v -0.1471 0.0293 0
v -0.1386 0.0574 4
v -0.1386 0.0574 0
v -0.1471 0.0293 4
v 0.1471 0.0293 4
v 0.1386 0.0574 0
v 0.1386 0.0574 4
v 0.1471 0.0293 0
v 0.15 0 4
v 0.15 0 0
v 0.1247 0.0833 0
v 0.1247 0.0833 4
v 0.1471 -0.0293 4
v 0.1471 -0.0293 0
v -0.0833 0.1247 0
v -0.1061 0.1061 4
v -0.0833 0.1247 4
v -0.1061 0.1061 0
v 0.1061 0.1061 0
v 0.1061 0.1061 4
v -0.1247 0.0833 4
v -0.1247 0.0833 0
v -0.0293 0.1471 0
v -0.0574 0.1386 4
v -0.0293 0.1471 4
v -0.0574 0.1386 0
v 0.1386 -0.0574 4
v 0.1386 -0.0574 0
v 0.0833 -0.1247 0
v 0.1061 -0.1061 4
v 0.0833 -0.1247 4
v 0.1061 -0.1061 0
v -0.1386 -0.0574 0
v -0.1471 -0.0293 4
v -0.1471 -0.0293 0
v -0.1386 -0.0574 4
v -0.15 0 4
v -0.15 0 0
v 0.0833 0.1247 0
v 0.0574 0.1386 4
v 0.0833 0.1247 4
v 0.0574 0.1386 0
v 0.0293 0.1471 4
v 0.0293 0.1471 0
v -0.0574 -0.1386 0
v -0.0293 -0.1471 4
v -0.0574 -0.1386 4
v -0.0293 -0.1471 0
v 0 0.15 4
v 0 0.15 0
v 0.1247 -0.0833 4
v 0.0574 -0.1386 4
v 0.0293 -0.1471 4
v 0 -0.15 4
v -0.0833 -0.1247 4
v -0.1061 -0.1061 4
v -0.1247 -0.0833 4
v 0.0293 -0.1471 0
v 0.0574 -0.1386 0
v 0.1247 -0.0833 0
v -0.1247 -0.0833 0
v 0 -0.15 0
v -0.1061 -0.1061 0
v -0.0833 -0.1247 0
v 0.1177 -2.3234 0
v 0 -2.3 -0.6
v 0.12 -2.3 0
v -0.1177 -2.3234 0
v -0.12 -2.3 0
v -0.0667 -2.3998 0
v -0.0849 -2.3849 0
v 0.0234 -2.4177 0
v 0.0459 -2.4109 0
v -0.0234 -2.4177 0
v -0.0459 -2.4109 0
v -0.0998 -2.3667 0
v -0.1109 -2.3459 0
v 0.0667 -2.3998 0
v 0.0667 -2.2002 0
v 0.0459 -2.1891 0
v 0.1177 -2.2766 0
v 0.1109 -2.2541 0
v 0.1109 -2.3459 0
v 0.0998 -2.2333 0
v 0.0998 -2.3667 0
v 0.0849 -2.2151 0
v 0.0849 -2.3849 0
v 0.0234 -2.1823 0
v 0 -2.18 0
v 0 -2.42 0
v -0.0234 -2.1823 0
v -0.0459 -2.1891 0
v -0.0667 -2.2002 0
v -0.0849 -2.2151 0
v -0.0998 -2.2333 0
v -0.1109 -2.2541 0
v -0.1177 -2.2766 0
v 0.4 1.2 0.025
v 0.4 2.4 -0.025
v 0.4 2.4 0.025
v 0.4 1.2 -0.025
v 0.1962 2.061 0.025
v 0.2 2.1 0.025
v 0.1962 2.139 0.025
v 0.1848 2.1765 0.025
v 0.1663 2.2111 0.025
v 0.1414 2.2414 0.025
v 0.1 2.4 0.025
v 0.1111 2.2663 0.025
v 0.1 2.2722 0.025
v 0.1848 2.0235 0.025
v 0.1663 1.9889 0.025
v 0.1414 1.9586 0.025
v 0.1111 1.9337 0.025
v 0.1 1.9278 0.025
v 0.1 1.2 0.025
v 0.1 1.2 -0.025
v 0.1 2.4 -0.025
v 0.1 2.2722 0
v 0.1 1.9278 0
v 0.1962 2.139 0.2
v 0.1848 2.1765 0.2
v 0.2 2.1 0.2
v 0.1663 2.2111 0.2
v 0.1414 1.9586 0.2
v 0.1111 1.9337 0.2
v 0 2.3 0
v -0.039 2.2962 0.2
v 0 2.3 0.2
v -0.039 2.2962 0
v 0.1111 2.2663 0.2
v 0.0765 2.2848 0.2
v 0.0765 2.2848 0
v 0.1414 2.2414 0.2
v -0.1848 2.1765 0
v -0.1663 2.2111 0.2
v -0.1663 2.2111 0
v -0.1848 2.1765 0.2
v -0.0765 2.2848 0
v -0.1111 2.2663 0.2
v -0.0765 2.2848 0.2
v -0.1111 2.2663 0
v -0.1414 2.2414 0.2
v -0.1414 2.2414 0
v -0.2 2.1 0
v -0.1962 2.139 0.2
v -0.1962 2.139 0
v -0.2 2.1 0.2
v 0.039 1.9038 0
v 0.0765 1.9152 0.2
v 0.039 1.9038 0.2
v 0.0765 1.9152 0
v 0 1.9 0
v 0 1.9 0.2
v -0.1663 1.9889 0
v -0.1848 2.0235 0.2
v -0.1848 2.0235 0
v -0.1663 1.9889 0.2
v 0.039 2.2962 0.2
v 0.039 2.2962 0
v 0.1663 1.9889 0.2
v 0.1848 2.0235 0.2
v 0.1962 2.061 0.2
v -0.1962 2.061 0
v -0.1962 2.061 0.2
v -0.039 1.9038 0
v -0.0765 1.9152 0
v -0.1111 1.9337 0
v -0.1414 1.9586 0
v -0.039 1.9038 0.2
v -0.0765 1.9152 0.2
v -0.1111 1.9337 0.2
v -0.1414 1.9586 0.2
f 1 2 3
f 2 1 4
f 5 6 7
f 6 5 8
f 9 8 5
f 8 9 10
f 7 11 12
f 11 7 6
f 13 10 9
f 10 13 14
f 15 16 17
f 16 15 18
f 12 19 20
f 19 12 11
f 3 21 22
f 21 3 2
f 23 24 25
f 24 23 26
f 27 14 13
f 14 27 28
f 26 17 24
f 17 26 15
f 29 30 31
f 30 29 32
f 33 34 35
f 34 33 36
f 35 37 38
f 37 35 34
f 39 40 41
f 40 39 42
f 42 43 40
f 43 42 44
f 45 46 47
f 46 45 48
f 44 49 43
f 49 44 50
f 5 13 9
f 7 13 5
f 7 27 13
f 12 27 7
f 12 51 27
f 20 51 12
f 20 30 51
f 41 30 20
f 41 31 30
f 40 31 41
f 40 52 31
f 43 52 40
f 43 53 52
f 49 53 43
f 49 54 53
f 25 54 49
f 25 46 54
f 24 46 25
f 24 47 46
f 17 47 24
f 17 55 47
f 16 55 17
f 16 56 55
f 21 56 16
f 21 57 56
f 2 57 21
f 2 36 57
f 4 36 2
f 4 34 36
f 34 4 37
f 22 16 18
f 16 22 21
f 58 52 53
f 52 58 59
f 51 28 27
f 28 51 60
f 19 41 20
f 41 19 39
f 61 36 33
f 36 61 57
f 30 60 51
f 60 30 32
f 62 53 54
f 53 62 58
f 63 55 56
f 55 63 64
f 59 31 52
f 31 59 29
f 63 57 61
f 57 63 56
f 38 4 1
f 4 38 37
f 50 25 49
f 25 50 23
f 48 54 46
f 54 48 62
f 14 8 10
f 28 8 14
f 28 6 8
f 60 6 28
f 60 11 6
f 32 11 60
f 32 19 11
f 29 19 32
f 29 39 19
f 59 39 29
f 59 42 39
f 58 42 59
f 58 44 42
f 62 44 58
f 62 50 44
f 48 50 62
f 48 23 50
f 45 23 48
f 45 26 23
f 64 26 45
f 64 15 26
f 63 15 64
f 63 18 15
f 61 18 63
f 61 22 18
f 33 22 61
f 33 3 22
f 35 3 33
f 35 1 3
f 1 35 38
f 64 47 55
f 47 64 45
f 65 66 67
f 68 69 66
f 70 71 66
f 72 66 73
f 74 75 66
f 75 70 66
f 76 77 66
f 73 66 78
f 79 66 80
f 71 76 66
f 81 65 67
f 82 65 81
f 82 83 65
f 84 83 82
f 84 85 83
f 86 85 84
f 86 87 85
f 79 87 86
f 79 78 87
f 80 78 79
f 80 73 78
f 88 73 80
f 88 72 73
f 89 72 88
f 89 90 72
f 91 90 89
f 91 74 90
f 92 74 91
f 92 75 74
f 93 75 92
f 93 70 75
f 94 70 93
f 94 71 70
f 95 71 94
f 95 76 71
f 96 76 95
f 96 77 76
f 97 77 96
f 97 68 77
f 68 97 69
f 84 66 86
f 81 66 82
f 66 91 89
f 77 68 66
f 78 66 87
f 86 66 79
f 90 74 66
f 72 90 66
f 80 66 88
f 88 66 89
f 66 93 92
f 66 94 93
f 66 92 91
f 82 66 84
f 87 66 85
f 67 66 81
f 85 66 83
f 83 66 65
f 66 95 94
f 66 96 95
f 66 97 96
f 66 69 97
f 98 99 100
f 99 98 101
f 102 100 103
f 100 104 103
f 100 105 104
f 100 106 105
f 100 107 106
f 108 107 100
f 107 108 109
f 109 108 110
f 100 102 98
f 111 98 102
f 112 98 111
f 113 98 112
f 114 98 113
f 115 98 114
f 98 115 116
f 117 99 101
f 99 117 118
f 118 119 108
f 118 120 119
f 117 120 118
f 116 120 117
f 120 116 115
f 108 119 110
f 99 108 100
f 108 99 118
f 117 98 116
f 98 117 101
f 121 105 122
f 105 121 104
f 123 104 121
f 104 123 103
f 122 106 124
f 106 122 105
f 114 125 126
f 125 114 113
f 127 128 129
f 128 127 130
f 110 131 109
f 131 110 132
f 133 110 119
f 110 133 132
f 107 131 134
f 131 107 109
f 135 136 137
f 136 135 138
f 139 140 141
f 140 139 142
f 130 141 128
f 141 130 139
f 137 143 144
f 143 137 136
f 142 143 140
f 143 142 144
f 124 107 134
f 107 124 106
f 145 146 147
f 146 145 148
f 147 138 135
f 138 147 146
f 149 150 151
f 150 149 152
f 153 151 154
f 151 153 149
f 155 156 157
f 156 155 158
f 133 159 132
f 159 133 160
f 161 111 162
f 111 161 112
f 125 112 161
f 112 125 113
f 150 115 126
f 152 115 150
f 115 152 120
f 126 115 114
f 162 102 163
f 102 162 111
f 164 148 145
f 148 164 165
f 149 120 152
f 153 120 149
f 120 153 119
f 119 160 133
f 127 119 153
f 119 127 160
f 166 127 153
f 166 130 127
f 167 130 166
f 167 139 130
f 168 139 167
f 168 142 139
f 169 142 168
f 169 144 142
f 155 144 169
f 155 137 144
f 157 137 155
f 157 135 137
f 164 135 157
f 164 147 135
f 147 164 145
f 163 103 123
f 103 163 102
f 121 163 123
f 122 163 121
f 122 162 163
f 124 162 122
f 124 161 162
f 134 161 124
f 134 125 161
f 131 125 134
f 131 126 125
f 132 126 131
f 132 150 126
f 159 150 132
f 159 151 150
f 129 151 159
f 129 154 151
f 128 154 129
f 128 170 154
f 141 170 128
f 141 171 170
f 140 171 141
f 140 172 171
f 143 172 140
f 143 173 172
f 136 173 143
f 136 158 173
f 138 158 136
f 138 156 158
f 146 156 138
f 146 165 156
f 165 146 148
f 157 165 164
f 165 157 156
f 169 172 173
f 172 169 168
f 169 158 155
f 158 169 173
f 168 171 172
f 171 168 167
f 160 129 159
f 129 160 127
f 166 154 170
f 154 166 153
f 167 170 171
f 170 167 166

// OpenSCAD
// Background color approximation: #f0f0f0 (light gray) - not rendered in OpenSCAD

// Pen body (main cylinder)
color("black") // #1a1a1a
cylinder(h=4, r=0.15, $fn=32);

// Pen tip (cone)
translate([0, -2.3, 0])
rotate([180, 0, 0])
color("#333333")
cylinder(h=0.6, r1=0.12, r2=0, $fn=32);

// Pen clip (thin box)
translate([0.25, 1.8, 0])
color("#444444")
cube([0.3, 1.2, 0.05], center=true);

// Clicker button (small cylinder)
translate([0, 2.1, 0])
color("#2c2c2c")
cylinder(h=0.2, r=0.2, $fn=32);
